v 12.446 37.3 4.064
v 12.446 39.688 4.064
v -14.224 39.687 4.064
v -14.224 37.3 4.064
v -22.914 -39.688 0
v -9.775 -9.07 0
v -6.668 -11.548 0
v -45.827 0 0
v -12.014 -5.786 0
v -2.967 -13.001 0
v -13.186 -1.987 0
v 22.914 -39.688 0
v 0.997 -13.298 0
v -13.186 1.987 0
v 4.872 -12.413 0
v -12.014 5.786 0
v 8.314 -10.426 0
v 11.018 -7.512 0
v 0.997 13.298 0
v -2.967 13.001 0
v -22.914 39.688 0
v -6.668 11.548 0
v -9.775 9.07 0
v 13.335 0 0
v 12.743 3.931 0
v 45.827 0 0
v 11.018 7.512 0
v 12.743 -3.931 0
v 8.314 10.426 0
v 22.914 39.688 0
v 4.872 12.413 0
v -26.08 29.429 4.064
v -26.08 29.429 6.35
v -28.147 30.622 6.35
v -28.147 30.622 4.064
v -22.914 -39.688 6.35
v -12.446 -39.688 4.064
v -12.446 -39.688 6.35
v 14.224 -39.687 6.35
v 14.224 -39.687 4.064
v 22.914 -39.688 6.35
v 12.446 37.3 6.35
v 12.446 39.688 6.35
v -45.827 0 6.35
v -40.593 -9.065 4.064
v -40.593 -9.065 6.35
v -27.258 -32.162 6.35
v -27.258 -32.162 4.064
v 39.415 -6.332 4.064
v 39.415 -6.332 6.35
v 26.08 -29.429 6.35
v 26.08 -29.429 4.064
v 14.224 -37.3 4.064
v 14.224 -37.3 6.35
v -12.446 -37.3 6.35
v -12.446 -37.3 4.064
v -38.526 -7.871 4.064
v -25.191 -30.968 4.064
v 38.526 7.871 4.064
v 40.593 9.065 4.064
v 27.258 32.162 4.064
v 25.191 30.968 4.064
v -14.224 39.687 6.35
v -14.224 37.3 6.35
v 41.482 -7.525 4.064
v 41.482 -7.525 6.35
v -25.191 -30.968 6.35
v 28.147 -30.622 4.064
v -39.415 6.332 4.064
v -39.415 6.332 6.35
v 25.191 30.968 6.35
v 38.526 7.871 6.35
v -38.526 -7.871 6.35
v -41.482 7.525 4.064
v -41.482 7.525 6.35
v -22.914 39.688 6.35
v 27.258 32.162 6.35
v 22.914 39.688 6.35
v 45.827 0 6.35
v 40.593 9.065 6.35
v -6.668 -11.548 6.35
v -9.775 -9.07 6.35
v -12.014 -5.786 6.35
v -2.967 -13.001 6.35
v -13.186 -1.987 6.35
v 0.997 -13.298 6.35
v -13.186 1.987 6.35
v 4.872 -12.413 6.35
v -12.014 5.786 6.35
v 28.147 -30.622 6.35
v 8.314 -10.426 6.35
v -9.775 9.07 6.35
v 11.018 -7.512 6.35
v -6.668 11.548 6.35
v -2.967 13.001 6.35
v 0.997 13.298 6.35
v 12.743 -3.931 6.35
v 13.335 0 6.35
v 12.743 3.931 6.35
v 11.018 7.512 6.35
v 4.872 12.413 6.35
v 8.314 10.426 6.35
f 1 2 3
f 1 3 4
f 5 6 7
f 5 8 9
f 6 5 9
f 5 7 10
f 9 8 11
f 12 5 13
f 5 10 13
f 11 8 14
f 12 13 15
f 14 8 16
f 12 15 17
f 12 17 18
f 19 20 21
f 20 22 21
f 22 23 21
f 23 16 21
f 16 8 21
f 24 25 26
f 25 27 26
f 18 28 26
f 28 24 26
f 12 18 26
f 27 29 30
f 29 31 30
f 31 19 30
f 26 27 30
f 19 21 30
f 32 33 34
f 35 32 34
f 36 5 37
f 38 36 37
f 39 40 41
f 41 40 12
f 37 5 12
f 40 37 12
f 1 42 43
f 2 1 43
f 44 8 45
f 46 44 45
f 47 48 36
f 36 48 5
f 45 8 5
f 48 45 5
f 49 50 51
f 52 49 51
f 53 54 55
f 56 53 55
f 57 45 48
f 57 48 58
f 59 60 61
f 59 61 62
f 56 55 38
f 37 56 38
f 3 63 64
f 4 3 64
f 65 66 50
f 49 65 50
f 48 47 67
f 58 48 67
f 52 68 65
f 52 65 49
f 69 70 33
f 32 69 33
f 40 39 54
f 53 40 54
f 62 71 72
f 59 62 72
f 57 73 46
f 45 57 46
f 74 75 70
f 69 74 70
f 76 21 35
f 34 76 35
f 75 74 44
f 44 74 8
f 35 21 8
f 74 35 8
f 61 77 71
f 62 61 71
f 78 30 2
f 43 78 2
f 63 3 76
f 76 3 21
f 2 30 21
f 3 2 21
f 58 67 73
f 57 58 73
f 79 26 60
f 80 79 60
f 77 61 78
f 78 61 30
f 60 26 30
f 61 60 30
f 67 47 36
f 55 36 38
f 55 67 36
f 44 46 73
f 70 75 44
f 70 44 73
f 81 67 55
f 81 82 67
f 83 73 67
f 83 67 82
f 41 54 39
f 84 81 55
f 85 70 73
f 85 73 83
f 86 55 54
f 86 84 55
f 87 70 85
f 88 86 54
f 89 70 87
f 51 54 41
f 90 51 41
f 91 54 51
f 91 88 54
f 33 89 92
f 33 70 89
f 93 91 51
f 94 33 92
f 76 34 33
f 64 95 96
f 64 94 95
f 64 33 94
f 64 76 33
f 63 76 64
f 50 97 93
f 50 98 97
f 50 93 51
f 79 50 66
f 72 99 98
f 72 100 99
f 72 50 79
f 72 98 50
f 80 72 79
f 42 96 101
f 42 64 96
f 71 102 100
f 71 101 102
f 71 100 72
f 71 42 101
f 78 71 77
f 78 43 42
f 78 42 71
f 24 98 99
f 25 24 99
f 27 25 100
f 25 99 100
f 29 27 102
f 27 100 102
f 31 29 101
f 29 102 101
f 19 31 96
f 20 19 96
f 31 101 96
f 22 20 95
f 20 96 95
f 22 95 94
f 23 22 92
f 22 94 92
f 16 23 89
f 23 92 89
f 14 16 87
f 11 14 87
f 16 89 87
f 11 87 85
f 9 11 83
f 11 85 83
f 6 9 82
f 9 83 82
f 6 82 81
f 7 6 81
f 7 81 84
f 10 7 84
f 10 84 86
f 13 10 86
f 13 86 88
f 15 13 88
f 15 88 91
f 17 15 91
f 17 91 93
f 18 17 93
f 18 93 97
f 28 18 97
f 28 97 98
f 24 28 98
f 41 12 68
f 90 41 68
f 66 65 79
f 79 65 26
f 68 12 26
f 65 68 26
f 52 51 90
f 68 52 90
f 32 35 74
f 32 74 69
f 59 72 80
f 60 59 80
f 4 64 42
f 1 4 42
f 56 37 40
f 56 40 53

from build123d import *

# Parameters (mm, degrees)
F1_DEPTH        = 6.35
F2_R            = 13.335
F3_DEPTH        = 25.4
F5_DEPTH        = 2.286
F5_COPIES_COUNT = 6


# Not quite as in the source:
# - a pattern or mirror of a feature is missing from the dataset's text; its kind, count and spacing are read off the source's solid


with BuildPart() as f1:
    # F0 (on Top) → F1 (new body)
    with BuildSketch(Plane.XY):
        Polygon((22.9135888085, 39.6875), (-22.9135888085, 39.6875), (-45.8271776169, 0), (-22.9135888085, -39.6875), (22.9135888085, -39.6875), (45.8271776169, 0), align=None)
    extrude(amount=F1_DEPTH)

    # F2 (on face) → F3 (cut)
    with BuildSketch(Plane.XY.offset(6.35)):
        Circle(F2_R)
    extrude(amount=-F3_DEPTH, mode=Mode.SUBTRACT)

    # F4 (on face) → F5 (cut)
    with BuildSketch(Plane.XY.offset(6.35)):
        Polygon((-38.5256609586, -7.8713978245), (-40.5933832127, -9.0651978245), (-27.2583832127, -32.1620953434), (-25.1906609586, -30.9682953434), align=None)
    f5 = extrude(amount=-F5_DEPTH, mode=Mode.SUBTRACT)

    # F5_copies: F5 ×6 about axis
    f5_copies_axis = Axis((0, 0, 0), (0, 0, 1))
    for i in range(1, F5_COPIES_COUNT):
        add(f5.rotate(f5_copies_axis, i * 360 / F5_COPIES_COUNT), mode=Mode.SUBTRACT)


solid = f1.part
